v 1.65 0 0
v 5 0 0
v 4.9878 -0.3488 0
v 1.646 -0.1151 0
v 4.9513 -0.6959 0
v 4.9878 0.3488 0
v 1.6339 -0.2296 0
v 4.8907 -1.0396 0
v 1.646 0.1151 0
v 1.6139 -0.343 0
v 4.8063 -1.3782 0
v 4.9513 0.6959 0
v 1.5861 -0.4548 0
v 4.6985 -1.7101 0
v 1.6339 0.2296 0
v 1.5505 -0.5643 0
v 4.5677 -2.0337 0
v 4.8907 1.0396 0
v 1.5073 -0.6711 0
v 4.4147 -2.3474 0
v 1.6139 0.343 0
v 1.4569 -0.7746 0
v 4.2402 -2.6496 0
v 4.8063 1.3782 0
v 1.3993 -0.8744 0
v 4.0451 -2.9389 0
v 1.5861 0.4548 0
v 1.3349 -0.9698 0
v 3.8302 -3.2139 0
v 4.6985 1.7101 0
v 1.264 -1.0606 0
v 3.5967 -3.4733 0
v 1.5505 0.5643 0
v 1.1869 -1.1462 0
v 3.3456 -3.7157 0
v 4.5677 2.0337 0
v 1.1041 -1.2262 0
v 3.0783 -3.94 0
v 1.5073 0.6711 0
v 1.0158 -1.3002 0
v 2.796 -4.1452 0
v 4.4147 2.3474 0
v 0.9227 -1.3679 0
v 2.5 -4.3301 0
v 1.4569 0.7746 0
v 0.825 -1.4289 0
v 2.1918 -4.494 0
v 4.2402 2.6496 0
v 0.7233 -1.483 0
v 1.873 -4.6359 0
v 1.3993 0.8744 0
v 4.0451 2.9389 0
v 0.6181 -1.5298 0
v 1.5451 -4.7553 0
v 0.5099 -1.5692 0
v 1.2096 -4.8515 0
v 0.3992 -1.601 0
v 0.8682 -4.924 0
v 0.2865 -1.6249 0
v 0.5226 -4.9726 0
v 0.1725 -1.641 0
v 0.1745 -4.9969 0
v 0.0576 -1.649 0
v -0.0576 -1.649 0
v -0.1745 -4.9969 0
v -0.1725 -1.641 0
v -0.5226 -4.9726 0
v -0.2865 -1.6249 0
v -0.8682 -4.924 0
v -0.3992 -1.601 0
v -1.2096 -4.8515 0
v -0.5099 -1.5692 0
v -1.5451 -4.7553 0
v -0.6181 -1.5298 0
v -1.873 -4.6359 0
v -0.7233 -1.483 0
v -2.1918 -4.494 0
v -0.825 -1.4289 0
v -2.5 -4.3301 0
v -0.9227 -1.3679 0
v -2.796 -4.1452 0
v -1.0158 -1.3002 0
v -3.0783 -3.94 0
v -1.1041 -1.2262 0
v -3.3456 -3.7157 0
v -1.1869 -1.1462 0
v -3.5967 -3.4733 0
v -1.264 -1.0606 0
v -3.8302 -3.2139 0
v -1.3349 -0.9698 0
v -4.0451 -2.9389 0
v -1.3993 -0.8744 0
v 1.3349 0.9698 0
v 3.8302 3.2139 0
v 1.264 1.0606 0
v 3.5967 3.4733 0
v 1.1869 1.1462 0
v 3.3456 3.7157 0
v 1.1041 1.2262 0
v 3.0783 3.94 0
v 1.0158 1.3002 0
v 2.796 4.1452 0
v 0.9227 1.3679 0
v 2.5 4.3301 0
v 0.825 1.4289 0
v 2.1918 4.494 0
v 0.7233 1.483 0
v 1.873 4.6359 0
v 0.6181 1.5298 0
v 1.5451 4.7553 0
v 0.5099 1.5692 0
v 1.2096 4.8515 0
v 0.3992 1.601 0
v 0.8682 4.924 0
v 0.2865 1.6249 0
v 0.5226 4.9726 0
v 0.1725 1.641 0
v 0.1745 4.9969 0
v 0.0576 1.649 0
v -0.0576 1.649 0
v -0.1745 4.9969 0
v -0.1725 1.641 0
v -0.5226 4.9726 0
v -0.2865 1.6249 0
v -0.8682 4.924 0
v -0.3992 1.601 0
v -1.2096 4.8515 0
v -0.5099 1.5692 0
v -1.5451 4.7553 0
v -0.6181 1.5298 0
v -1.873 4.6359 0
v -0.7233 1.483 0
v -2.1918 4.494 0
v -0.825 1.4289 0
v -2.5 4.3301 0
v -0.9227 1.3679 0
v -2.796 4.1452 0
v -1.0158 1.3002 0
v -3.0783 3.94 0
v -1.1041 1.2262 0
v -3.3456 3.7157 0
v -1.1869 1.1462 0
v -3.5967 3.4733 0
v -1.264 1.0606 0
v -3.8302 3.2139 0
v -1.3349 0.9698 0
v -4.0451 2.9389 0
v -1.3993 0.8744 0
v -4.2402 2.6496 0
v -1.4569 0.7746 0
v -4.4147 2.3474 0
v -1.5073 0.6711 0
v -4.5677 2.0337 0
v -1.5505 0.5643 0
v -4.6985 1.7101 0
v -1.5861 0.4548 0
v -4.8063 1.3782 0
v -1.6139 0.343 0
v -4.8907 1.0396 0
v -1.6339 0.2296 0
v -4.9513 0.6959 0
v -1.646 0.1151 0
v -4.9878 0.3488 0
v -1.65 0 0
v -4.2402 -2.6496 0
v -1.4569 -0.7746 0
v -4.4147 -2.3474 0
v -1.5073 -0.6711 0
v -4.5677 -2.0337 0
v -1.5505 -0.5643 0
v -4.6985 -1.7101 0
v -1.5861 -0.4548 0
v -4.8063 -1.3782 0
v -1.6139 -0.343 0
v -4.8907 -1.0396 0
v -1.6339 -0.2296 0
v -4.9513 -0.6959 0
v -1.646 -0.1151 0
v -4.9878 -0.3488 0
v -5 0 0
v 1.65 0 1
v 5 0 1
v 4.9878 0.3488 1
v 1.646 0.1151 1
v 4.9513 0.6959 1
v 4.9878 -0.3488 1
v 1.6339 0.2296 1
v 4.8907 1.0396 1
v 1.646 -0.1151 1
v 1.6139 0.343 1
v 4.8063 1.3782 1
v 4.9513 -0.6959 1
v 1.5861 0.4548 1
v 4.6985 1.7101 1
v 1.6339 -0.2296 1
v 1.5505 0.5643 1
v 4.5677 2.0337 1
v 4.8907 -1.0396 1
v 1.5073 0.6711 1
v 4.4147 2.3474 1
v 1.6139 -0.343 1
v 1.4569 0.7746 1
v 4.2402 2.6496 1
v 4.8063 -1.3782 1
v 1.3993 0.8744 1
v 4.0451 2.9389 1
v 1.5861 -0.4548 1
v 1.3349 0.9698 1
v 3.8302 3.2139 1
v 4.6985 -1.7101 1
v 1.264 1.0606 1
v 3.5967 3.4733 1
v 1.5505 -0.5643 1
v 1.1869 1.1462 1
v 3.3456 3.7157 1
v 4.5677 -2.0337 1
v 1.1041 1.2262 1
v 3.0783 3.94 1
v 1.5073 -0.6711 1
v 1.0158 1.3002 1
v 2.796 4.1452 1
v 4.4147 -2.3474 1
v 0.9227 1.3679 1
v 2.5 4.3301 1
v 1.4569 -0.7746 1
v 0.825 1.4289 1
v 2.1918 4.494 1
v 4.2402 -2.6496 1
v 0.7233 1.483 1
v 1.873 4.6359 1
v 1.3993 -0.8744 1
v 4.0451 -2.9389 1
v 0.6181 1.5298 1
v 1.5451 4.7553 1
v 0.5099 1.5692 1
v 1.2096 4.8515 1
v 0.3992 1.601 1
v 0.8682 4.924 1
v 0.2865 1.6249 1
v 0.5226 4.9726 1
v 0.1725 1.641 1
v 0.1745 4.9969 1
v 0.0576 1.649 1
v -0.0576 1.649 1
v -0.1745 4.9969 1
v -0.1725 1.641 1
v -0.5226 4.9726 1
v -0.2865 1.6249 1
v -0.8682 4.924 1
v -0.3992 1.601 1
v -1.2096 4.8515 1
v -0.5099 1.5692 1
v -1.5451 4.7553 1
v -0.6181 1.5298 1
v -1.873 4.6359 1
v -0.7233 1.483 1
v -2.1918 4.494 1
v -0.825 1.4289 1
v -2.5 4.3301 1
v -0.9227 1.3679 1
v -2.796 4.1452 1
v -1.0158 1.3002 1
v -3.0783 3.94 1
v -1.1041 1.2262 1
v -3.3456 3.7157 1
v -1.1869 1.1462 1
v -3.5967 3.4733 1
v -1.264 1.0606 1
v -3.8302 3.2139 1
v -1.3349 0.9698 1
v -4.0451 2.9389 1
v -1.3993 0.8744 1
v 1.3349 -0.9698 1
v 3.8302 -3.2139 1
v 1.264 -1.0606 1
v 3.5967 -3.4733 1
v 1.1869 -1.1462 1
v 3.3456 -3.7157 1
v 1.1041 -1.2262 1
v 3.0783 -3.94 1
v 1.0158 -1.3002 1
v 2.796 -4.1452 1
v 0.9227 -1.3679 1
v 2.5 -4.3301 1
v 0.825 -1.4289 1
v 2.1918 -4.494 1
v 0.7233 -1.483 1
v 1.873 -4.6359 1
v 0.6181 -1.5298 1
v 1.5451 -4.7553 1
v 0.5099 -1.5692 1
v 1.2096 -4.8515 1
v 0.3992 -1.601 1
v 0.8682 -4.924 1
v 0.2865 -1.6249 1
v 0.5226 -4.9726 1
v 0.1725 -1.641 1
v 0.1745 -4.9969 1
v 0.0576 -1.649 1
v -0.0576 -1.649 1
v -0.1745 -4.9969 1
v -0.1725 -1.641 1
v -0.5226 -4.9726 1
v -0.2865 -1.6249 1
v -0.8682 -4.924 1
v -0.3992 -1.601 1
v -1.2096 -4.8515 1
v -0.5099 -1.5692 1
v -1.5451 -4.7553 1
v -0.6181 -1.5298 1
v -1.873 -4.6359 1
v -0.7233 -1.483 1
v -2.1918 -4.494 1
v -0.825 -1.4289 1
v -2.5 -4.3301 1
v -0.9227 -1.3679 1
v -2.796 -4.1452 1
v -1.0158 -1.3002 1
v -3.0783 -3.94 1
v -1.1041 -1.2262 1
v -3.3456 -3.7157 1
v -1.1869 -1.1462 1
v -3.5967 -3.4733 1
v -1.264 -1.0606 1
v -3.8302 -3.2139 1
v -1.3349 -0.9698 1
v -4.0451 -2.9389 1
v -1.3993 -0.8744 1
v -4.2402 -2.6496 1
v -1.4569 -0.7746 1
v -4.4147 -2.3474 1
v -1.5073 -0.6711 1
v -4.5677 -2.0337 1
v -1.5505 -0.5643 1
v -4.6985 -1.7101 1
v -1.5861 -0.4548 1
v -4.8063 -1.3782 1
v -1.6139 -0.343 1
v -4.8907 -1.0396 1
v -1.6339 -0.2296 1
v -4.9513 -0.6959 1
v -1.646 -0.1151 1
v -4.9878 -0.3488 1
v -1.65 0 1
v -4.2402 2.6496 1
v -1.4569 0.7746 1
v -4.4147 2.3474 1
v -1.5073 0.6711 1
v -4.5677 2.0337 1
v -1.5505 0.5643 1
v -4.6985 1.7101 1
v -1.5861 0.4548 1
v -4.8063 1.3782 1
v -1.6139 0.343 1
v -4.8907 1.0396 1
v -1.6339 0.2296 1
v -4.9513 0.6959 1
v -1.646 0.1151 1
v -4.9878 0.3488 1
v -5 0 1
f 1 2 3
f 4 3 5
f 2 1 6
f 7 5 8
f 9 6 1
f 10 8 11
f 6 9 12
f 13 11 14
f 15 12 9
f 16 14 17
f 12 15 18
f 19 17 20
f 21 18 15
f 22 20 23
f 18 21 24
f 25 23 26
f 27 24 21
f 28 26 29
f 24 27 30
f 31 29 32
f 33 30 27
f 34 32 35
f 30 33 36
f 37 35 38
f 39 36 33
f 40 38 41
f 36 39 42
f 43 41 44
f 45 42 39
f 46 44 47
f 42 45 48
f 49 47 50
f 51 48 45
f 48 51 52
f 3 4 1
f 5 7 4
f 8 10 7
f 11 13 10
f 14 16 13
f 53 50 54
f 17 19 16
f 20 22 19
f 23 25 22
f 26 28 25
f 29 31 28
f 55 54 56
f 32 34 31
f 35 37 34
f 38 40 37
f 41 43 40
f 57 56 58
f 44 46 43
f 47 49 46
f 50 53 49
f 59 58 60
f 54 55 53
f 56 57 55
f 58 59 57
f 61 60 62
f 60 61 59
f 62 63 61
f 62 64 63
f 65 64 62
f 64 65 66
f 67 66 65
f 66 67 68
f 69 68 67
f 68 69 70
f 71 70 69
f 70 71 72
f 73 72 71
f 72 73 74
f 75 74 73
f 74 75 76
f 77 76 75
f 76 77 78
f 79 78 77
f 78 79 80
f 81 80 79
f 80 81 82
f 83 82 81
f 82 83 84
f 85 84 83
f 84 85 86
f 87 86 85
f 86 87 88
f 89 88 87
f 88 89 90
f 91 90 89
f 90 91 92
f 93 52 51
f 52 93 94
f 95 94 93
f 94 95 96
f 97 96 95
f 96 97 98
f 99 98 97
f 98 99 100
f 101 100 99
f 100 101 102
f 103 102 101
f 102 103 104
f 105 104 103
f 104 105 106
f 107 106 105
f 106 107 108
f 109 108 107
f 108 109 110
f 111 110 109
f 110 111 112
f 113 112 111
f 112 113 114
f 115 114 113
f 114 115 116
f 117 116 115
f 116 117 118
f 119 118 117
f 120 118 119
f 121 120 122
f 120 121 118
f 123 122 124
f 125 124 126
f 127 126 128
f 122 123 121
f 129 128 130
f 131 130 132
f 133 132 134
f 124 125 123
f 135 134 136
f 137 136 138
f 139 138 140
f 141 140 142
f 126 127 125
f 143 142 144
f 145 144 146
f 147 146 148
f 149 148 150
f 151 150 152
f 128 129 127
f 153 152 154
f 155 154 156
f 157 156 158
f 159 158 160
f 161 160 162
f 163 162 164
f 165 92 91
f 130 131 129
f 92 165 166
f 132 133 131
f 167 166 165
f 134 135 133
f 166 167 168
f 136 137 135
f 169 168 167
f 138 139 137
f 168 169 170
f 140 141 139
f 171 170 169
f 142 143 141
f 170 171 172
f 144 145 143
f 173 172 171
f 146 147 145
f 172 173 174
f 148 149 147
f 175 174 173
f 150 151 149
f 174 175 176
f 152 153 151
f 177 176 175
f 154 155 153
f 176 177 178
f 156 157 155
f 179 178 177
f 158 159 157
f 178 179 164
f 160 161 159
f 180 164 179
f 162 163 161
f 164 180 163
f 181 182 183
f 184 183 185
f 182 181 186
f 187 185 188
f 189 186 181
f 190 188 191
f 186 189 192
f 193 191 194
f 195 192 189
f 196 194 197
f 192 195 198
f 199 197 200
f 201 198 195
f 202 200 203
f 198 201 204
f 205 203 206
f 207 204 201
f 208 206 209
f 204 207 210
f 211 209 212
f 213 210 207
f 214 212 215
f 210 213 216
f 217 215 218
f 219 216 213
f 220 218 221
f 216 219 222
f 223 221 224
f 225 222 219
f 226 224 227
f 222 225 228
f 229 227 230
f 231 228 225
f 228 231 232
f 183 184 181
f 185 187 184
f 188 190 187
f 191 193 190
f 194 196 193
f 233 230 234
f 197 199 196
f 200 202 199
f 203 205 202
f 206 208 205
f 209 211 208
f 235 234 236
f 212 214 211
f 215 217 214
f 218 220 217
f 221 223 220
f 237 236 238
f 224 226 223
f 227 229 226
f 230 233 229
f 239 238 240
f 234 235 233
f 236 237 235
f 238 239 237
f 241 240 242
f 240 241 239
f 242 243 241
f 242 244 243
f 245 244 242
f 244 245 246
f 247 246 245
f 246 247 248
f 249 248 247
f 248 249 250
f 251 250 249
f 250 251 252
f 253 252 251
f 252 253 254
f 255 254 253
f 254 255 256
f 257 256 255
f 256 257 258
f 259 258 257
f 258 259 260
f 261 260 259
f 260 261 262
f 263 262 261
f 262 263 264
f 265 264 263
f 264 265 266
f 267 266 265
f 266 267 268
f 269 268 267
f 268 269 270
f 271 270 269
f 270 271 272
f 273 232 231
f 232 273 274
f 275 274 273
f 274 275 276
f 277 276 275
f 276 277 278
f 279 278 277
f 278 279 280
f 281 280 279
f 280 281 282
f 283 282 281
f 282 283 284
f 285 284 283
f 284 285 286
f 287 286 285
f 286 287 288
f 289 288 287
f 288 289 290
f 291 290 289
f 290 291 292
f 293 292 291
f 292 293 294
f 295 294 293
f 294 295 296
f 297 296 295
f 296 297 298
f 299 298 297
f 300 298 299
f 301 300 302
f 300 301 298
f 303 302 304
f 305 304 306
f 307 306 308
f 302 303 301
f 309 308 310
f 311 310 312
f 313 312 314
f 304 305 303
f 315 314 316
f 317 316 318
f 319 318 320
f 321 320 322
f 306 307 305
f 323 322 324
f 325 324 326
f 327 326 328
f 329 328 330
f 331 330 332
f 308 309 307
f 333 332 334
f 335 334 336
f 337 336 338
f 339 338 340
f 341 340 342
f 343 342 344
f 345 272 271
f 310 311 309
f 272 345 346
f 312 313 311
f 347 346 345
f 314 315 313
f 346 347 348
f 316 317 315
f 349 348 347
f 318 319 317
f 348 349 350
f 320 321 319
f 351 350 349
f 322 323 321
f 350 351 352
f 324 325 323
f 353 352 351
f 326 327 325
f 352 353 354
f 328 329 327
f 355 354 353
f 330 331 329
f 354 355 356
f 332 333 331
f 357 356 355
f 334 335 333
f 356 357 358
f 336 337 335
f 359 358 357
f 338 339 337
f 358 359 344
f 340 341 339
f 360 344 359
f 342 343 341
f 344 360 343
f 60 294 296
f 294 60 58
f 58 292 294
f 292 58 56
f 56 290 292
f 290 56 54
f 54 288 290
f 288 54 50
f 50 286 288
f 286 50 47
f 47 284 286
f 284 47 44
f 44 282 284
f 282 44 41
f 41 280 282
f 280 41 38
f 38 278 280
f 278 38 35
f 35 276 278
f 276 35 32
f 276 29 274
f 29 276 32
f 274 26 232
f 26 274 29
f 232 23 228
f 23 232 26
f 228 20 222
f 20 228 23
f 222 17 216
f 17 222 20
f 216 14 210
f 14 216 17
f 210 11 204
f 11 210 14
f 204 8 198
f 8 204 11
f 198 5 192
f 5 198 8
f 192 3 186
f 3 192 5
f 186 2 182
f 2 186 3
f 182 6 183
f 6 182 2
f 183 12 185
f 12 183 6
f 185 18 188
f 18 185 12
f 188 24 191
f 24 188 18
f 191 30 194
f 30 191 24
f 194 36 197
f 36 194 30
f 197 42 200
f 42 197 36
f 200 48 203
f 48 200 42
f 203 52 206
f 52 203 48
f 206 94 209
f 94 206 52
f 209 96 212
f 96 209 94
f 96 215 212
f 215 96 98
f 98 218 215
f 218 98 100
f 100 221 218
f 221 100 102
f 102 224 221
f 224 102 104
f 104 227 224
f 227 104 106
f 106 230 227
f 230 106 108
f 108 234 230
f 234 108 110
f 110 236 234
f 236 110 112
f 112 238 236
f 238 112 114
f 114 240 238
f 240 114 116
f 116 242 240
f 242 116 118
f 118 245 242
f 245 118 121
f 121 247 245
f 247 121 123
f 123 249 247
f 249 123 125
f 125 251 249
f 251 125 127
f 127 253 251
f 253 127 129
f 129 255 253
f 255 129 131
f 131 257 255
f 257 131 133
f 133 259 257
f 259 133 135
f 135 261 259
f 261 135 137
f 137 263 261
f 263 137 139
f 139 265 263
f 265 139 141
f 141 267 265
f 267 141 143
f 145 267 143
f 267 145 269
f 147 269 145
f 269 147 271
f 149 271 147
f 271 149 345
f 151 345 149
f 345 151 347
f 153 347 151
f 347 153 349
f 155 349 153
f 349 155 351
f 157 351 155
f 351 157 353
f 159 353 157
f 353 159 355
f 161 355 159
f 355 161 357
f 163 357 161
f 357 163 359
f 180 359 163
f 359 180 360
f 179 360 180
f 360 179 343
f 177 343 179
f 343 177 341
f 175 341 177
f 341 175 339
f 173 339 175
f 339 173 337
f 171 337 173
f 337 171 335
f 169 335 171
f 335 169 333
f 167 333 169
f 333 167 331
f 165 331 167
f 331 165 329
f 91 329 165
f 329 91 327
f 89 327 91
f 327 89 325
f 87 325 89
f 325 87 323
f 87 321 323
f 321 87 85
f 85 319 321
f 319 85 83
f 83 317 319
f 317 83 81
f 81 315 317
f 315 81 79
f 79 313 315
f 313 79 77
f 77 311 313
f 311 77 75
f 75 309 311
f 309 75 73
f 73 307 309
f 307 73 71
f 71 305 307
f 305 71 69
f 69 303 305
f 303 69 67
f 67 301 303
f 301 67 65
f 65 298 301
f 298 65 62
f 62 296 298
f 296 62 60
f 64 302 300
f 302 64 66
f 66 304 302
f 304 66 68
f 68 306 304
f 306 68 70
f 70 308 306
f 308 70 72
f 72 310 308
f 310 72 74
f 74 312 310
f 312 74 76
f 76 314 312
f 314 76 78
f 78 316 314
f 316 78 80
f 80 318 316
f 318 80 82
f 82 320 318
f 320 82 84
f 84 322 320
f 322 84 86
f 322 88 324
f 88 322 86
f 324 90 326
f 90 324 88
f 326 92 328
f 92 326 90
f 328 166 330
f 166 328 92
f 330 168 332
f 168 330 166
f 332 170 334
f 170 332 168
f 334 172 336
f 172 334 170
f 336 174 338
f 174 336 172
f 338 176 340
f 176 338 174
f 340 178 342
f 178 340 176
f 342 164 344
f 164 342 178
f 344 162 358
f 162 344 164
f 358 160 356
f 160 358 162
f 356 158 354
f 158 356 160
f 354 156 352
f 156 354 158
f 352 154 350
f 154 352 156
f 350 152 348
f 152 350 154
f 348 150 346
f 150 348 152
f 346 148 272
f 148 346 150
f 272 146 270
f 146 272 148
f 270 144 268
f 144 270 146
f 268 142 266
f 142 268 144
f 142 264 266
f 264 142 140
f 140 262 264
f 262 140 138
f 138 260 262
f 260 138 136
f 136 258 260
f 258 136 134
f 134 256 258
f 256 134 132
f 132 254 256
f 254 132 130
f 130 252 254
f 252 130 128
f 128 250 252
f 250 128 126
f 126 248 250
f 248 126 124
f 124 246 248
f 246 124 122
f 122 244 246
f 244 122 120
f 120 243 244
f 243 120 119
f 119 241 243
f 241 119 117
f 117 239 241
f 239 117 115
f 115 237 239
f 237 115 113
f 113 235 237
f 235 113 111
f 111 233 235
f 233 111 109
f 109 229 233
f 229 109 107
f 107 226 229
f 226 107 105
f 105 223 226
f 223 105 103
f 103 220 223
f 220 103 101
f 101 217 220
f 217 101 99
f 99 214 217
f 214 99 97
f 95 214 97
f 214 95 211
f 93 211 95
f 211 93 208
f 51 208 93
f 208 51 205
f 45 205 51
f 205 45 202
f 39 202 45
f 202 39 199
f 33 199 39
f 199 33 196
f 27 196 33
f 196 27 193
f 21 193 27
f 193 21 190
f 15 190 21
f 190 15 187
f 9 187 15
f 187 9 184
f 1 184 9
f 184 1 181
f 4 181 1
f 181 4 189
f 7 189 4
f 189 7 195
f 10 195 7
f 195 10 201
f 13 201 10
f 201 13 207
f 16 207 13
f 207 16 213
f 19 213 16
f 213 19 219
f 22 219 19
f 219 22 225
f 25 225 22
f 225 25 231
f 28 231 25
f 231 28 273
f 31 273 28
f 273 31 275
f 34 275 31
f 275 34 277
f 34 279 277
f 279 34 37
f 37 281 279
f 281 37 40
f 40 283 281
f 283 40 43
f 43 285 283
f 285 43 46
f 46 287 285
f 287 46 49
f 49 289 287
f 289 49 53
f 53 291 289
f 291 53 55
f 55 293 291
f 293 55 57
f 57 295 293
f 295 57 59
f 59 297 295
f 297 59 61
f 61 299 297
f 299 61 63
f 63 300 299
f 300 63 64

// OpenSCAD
// file: generic/washer.scad
include <lib.scad>;

function pvWasherDatasheet(outer_diameter, inner_diameter, thickness) =
     [["outer_diameter", outer_diameter],
      ["inner_diameter", inner_diameter],
      ["thickness", thickness]];

module pmWasher(datasheet) {
     linear_extrude(height=property(datasheet, "thickness")) {
          ring(outer_radius=property(datasheet, "outer_diameter")/2,
               inner_radius=property(datasheet, "inner_diameter")/2);
     }
}

pmWasher(pvWasherDatasheet(outer_diameter=10, inner_diameter=5, thickness=1));
// main file
include <generic/washer.scad>

function vM3WasherDatasheet() =
     pvWasherDatasheet(outer_diameter=8.8, inner_diameter=3.3, thickness=1);

module mM3Washer() {
     color("silver") pmWasher(vM3WasherDatasheet());
}

mM3Washer();
